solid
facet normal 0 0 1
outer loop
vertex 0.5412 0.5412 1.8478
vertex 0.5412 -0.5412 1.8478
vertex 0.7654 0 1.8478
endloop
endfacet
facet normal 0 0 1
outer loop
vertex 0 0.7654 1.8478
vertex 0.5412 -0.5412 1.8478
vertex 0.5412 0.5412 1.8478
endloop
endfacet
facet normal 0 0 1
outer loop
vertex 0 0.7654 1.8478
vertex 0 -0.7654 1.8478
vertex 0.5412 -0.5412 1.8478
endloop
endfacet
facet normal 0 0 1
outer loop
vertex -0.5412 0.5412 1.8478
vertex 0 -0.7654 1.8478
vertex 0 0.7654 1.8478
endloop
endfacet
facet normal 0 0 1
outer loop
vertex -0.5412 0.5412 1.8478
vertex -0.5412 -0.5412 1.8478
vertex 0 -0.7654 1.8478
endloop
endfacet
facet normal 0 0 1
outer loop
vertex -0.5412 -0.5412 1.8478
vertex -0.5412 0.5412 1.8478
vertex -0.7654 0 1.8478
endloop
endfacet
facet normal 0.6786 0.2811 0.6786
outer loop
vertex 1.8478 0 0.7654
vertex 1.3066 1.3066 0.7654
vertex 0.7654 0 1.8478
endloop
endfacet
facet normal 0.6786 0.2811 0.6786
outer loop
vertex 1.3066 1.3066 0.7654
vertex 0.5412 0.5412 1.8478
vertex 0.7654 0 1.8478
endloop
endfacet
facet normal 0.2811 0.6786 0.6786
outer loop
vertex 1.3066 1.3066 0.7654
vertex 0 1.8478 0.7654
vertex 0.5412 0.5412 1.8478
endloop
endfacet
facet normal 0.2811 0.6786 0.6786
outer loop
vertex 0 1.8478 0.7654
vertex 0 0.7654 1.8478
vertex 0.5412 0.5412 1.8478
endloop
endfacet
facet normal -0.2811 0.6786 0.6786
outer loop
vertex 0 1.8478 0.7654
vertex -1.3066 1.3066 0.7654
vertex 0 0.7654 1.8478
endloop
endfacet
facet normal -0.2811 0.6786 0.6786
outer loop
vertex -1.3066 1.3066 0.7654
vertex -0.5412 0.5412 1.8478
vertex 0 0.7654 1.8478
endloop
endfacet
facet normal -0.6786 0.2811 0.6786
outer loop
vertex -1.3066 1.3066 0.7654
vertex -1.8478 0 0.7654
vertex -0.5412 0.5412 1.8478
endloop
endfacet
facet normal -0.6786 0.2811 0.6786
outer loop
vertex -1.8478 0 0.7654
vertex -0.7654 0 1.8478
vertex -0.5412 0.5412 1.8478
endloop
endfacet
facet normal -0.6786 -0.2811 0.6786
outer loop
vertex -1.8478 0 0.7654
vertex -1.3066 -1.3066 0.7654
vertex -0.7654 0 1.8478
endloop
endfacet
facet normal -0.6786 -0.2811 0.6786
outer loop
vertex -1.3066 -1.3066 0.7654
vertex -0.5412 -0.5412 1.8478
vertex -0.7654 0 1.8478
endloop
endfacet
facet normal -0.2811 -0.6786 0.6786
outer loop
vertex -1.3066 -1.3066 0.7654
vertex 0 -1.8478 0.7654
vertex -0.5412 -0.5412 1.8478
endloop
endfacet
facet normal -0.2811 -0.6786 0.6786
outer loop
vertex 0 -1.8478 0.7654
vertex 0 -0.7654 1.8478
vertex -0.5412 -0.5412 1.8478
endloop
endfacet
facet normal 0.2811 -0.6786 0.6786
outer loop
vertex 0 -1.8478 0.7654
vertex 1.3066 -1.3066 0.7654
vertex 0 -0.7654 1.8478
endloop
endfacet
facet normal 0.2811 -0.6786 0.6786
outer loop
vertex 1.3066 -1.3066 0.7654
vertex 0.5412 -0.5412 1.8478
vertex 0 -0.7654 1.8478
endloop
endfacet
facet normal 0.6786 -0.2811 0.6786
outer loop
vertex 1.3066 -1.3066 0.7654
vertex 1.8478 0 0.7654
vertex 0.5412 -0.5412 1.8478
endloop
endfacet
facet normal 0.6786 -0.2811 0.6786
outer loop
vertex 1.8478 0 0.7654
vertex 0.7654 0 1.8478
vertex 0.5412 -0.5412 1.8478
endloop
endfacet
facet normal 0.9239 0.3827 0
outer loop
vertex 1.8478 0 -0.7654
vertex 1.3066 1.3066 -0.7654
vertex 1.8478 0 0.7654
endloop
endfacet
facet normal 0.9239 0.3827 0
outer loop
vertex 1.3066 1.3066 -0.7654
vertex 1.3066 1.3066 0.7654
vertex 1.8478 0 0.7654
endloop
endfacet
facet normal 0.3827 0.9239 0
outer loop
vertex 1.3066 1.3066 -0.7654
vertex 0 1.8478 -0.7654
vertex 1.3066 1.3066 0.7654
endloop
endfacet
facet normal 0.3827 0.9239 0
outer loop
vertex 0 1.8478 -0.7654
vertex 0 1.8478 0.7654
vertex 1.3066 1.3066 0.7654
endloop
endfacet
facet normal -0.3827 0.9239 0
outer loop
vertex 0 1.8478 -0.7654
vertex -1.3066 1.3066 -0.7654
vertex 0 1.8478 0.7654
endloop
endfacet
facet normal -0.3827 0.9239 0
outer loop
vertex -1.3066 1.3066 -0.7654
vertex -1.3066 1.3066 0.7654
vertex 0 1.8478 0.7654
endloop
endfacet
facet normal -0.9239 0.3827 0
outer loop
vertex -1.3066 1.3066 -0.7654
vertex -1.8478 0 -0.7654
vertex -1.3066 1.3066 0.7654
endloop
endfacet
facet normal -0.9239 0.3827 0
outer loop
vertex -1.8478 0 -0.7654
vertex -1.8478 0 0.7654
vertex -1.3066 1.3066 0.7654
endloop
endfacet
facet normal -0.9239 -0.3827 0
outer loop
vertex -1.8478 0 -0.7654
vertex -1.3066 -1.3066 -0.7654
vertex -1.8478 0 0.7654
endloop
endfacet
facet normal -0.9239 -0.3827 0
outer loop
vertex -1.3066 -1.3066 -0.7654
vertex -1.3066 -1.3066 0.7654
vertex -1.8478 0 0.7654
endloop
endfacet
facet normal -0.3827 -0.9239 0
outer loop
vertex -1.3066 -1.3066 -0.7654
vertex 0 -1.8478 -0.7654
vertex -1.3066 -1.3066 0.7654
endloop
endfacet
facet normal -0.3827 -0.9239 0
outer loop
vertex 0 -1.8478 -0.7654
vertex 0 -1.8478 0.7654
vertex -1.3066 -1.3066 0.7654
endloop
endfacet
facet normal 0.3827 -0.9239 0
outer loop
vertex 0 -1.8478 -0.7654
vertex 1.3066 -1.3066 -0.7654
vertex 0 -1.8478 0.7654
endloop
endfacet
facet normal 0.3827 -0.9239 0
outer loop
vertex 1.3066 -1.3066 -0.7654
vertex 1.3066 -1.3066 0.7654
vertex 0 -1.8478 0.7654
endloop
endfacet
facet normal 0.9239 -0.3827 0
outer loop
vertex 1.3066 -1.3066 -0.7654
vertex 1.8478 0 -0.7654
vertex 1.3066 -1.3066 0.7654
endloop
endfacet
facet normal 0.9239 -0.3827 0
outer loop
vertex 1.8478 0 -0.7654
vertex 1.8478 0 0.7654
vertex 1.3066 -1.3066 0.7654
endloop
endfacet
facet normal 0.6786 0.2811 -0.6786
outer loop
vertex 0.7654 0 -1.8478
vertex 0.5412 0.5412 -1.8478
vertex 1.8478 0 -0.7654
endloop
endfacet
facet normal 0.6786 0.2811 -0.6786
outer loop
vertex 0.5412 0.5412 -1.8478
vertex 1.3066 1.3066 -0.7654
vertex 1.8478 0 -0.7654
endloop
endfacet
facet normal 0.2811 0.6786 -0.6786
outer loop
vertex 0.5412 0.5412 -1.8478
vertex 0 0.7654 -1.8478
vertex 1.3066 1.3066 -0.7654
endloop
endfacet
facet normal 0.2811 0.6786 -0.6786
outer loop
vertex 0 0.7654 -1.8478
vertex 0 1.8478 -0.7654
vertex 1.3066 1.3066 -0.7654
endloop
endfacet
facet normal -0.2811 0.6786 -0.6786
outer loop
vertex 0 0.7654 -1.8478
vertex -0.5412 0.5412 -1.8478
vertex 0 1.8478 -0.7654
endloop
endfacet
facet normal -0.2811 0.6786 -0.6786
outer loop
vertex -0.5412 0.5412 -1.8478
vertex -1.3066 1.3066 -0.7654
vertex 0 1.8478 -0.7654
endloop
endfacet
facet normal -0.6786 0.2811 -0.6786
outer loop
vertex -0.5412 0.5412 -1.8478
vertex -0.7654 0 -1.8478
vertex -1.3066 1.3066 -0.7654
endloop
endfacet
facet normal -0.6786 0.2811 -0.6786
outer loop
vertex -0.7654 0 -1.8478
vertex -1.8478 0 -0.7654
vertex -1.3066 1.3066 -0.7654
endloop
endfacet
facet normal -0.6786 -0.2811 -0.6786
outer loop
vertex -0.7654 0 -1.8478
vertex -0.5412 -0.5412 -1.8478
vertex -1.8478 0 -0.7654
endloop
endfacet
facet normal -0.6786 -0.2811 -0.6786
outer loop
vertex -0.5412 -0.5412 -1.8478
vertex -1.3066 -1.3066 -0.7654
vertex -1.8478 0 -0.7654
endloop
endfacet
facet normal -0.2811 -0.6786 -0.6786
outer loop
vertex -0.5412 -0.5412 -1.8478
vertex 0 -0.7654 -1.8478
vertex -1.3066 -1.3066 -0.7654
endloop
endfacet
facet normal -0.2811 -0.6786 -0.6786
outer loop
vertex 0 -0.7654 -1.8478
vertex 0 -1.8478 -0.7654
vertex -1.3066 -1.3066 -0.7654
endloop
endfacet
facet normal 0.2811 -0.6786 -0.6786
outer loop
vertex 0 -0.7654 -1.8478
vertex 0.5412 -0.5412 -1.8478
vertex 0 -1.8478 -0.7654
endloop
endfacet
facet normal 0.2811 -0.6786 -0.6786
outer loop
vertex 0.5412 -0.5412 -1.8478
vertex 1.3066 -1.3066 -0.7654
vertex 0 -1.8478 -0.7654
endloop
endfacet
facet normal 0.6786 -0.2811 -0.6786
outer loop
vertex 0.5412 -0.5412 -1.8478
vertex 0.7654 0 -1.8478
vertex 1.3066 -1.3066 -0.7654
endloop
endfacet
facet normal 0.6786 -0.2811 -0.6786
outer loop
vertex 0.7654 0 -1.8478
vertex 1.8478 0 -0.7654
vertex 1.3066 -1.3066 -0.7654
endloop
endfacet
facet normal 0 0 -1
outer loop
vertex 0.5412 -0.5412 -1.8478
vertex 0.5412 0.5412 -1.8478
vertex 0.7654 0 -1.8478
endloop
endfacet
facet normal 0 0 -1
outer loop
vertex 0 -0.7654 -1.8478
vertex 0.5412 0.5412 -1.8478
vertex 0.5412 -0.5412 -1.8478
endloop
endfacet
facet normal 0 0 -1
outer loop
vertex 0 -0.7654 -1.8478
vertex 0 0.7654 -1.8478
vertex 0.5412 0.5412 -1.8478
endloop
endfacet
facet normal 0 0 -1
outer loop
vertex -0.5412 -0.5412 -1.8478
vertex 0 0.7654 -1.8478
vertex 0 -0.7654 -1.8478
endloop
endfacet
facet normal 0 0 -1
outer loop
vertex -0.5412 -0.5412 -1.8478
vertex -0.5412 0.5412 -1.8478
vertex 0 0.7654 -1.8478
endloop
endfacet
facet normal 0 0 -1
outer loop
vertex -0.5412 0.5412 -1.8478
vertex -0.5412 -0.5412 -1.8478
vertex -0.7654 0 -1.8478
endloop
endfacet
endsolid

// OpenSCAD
// $preview is false when rendering
if ($preview) cube(1); else sphere(2, $fn = 8);
